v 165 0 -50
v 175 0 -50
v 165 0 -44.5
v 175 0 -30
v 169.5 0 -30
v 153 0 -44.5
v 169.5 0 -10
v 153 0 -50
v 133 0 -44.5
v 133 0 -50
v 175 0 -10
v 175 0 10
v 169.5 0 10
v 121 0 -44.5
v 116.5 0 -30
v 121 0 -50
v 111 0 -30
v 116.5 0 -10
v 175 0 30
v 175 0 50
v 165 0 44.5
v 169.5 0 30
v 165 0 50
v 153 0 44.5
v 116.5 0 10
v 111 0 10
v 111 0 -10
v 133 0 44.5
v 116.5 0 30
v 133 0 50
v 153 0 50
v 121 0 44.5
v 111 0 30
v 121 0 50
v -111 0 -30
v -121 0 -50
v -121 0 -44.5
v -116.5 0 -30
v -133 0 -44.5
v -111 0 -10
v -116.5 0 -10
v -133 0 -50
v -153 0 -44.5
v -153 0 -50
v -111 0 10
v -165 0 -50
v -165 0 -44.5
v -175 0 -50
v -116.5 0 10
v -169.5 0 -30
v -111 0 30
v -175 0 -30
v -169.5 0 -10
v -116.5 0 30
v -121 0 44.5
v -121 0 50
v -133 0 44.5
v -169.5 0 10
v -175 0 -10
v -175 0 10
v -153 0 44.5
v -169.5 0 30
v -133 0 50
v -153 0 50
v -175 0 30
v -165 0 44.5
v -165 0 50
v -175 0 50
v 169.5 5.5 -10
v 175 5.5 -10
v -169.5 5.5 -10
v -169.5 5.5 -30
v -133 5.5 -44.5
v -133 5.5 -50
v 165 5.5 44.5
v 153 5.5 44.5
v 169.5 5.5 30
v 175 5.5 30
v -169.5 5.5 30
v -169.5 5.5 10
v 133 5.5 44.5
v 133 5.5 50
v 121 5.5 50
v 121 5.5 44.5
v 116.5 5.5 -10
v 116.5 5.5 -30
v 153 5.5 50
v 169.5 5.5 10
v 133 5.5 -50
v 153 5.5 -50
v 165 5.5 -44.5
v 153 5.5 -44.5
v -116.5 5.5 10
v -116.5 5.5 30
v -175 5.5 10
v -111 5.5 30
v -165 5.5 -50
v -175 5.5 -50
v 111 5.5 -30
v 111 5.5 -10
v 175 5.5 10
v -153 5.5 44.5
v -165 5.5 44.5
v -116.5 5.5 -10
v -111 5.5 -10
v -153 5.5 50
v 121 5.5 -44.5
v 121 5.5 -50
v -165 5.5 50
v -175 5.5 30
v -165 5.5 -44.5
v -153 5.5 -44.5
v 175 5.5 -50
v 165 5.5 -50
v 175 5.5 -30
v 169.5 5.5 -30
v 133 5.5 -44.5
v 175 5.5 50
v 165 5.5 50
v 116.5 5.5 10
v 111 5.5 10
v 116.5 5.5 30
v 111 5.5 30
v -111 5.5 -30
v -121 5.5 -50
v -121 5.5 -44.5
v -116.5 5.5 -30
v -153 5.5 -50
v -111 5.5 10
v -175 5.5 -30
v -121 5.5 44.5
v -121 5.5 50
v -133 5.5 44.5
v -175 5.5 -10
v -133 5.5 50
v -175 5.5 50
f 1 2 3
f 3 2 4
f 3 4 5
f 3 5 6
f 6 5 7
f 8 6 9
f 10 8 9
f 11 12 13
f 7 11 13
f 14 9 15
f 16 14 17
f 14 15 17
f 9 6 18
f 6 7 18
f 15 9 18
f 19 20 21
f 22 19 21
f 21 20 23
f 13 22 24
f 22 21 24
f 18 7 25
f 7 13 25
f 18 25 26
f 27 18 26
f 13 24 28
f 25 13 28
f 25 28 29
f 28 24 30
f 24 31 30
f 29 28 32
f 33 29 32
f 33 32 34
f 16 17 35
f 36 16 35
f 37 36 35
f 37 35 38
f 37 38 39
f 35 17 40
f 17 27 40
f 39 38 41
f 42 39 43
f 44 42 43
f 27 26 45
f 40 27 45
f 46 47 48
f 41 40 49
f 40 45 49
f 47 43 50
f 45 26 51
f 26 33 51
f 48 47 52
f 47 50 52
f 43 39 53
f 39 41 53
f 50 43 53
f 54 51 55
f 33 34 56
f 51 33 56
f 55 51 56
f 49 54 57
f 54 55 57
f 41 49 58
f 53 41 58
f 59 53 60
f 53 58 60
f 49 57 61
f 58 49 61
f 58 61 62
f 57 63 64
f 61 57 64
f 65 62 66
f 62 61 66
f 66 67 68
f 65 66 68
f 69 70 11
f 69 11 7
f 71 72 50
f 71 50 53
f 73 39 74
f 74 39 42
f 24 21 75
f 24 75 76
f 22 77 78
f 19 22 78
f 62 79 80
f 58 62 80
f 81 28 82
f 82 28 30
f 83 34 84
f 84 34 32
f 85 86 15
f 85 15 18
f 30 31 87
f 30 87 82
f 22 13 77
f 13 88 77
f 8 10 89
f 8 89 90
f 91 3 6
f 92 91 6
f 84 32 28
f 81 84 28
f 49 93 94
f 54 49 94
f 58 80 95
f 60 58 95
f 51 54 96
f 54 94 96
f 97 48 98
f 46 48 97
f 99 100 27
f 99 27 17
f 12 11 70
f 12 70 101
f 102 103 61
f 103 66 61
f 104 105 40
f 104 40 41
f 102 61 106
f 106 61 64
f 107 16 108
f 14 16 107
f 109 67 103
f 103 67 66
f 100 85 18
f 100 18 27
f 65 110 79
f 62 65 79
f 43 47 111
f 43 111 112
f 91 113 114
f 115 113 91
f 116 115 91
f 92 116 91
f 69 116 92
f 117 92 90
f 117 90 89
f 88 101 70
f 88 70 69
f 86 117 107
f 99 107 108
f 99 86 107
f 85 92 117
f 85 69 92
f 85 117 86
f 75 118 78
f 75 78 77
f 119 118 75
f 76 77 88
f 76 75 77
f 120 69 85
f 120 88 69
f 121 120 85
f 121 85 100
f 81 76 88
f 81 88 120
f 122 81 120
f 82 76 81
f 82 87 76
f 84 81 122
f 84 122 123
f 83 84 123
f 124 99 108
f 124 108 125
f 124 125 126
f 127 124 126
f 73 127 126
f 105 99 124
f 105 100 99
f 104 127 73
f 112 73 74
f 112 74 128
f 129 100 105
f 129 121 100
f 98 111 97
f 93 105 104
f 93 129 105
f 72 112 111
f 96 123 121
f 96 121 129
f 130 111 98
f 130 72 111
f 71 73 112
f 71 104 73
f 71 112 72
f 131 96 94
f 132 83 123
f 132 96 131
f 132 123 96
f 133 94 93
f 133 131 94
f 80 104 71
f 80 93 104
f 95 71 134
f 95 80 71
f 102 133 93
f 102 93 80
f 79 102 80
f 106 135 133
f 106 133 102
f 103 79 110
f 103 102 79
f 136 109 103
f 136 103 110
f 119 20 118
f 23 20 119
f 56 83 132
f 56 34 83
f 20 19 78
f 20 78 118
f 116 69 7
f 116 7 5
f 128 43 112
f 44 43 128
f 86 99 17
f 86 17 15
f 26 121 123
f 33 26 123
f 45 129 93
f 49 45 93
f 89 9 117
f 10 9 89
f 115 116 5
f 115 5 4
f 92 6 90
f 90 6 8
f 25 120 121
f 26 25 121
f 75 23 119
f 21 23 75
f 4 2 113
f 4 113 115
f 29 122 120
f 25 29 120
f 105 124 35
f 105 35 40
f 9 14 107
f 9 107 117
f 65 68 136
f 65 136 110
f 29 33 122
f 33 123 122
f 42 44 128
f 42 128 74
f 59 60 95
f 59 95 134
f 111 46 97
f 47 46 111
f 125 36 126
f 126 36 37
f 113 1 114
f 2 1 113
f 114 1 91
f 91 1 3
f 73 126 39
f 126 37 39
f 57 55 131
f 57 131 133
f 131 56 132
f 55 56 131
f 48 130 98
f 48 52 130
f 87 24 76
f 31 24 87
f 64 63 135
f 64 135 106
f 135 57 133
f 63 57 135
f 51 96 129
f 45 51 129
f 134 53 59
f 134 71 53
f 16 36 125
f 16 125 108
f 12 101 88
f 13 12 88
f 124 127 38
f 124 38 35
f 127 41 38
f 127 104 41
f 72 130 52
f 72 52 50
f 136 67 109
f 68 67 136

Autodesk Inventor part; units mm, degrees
ref_plane "YZ Plane" through (0, 0, 0) normal (1, 0, 0) x (0, 1, 0)
ref_plane "XZ Plane" through (0, 0, 0) normal (0, 1, 0) x (-1, 0, 0)
ref_plane "XY Plane" through (0, 0, 0) normal (0, 0, 1) x (1, 0, 0)
sketch "Block1" plane through (0, 0, 0) normal (0, 0, 1) x (1, 0, 0)
  line L0 (-117.6, 50.1) -> (117.6, 50.1)
  line L1 (117.6, 50.1) -> (117.6, 41.1)
  line L2 (117.6, 41.1) -> (129.4, 41.1)
  line L3 (129.4, 41.1) -> (129.4, 50.1)
  line L4 (129.4, 50.1) -> (149.6, 50.1)
  line L5 (149.6, 50.1) -> (149.6, 41.1)
  line L6 (149.6, 41.1) -> (161.4, 41.1)
  line L7 (161.4, 41.1) -> (161.4, 50.1)
  line L8 (161.4, 50.1) -> (175.1, 50.1)
  line L9 (175.1, 50.1) -> (175.1, 29.9)
  line L10 (175.1, 29.9) -> (166.1, 29.9)
  line L11 (166.1, 29.9) -> (166.1, 10.1)
  line L12 (166.1, 10.1) -> (175.1, 10.1)
  line L13 (175.1, 10.1) -> (175.1, -10.1)
  line L14 (175.1, -10.1) -> (166.1, -10.1)
  line L15 (166.1, -10.1) -> (166.1, -29.9)
  line L16 (166.1, -29.9) -> (175.1, -29.9)
  line L17 (175.1, -29.9) -> (175.1, -50.1)
  line L18 (175.1, -50.1) -> (161.4, -50.1)
  line L19 (161.4, -50.1) -> (161.4, -41.1)
  line L20 (161.4, -41.1) -> (149.6, -41.1)
  line L21 (149.6, -41.1) -> (149.6, -50.1)
  line L22 (149.6, -50.1) -> (129.4, -50.1)
  line L23 (129.4, -50.1) -> (129.4, -41.1)
  line L24 (129.4, -41.1) -> (117.6, -41.1)
  line L25 (117.6, -41.1) -> (117.6, -50.1)
  line L26 (117.6, -50.1) -> (-117.6, -50.1)
  line L27 (-117.6, -50.1) -> (-117.6, -41.1)
  line L28 (-117.6, -41.1) -> (-129.4, -41.1)
  line L29 (-129.4, -41.1) -> (-129.4, -50.1)
  line L30 (-129.4, -50.1) -> (-149.6, -50.1)
  line L31 (-149.6, -50.1) -> (-149.6, -41.1)
  line L32 (-149.6, -41.1) -> (-161.4, -41.1)
  line L33 (-161.4, -41.1) -> (-161.4, -50.1)
  line L34 (-161.4, -50.1) -> (-175.1, -50.1)
  line L35 (-175.1, -50.1) -> (-175.1, -29.9)
  line L36 (-175.1, -29.9) -> (-166.1, -29.9)
  line L37 (-166.1, -29.9) -> (-166.1, -10.1)
  line L38 (-166.1, -10.1) -> (-175.1, -10.1)
  line L39 (-175.1, -10.1) -> (-175.1, 10.1)
  line L40 (-175.1, 10.1) -> (-166.1, 10.1)
  line L41 (-166.1, 10.1) -> (-166.1, 29.9)
  line L42 (-166.1, 29.9) -> (-175.1, 29.9)
  line L43 (-175.1, 29.9) -> (-175.1, 50.1)
  line L44 (-175.1, 50.1) -> (-161.4, 50.1)
  line L45 (-161.4, 50.1) -> (-161.4, 41.1)
  line L46 (-161.4, 41.1) -> (-149.6, 41.1)
  line L47 (-149.6, 41.1) -> (-149.6, 50.1)
  line L48 (-149.6, 50.1) -> (-129.4, 50.1)
  line L49 (-129.4, 50.1) -> (-129.4, 41.1)
  line L50 (-129.4, 41.1) -> (-117.6, 41.1)
  line L51 (-117.6, 41.1) -> (-117.6, 50.1)
  line L52 (-103.9, 30.1) -> (-103.9, 9.9)
  line L53 (-103.9, 9.9) -> (-113.1, 9.9)
  line L54 (-113.1, 9.9) -> (-113.1, 30.1)
  line L55 (-113.1, 30.1) -> (-103.9, 30.1)
  line L56 (-103.9, -9.9) -> (-113.1, -9.9)
  line L57 (-113.1, -9.9) -> (-113.1, -30.1)
  line L58 (-113.1, -30.1) -> (-103.9, -30.1)
  line L59 (-103.9, -30.1) -> (-103.9, -9.9)
  line L60 (113.1, 30.1) -> (113.1, 9.9)
  line L61 (113.1, 9.9) -> (103.9, 9.9)
  line L62 (103.9, 9.9) -> (103.9, 30.1)
  line L63 (103.9, 30.1) -> (113.1, 30.1)
  line L64 (113.1, -9.9) -> (103.9, -9.9)
  line L65 (103.9, -9.9) -> (103.9, -30.1)
  line L66 (103.9, -30.1) -> (113.1, -30.1)
  line L67 (113.1, -30.1) -> (113.1, -9.9)
  point P0 (0, 0)
sketch "Block2" plane through (0, 0, 0) normal (0, 0, 1) x (1, 0, 0)
  line L0 (-117.7, 50.2) -> (117.7, 50.2)
  line L1 (117.7, 50.2) -> (117.7, 41.2)
  line L2 (117.7, 41.2) -> (129.3, 41.2)
  line L3 (129.3, 41.2) -> (129.3, 50.2)
  line L4 (129.3, 50.2) -> (149.7, 50.2)
  line L5 (149.7, 50.2) -> (149.7, 41.2)
  line L6 (149.7, 41.2) -> (161.3, 41.2)
  line L7 (161.3, 41.2) -> (161.3, 50.2)
  line L8 (161.3, 50.2) -> (175.2, 50.2)
  line L9 (175.2, 50.2) -> (175.2, 29.8)
  line L10 (175.2, 29.8) -> (166.2, 29.8)
  line L11 (166.2, 29.8) -> (166.2, 10.2)
  line L12 (166.2, 10.2) -> (175.2, 10.2)
  line L13 (175.2, 10.2) -> (175.2, -10.2)
  line L14 (175.2, -10.2) -> (166.2, -10.2)
  line L15 (166.2, -10.2) -> (166.2, -29.8)
  line L16 (166.2, -29.8) -> (175.2, -29.8)
  line L17 (175.2, -29.8) -> (175.2, -50.2)
  line L18 (175.2, -50.2) -> (161.3, -50.2)
  line L19 (161.3, -50.2) -> (161.3, -41.2)
  line L20 (161.3, -41.2) -> (149.7, -41.2)
  line L21 (149.7, -41.2) -> (149.7, -50.2)
  line L22 (149.7, -50.2) -> (129.3, -50.2)
  line L23 (129.3, -50.2) -> (129.3, -41.2)
  line L24 (129.3, -41.2) -> (117.7, -41.2)
  line L25 (117.7, -41.2) -> (117.7, -50.2)
  line L26 (117.7, -50.2) -> (-117.7, -50.2)
  line L27 (-117.7, -50.2) -> (-117.7, -41.2)
  line L28 (-117.7, -41.2) -> (-129.3, -41.2)
  line L29 (-129.3, -41.2) -> (-129.3, -50.2)
  line L30 (-129.3, -50.2) -> (-149.7, -50.2)
  line L31 (-149.7, -50.2) -> (-149.7, -41.2)
  line L32 (-149.7, -41.2) -> (-161.3, -41.2)
  line L33 (-161.3, -41.2) -> (-161.3, -50.2)
  line L34 (-161.3, -50.2) -> (-175.2, -50.2)
  line L35 (-175.2, -50.2) -> (-175.2, -29.8)
  line L36 (-175.2, -29.8) -> (-166.2, -29.8)
  line L37 (-166.2, -29.8) -> (-166.2, -10.2)
  line L38 (-166.2, -10.2) -> (-175.2, -10.2)
  line L39 (-175.2, -10.2) -> (-175.2, 10.2)
  line L40 (-175.2, 10.2) -> (-166.2, 10.2)
  line L41 (-166.2, 10.2) -> (-166.2, 29.8)
  line L42 (-166.2, 29.8) -> (-175.2, 29.8)
  line L43 (-175.2, 29.8) -> (-175.2, 50.2)
  line L44 (-175.2, 50.2) -> (-161.3, 50.2)
  line L45 (-161.3, 50.2) -> (-161.3, 41.2)
  line L46 (-161.3, 41.2) -> (-149.7, 41.2)
  line L47 (-149.7, 41.2) -> (-149.7, 50.2)
  line L48 (-149.7, 50.2) -> (-129.3, 50.2)
  line L49 (-129.3, 50.2) -> (-129.3, 41.2)
  line L50 (-129.3, 41.2) -> (-117.7, 41.2)
  line L51 (-117.7, 41.2) -> (-117.7, 50.2)
  line L52 (-103.8, 30.2) -> (-103.8, 9.8)
  line L53 (-103.8, 9.8) -> (-113.2, 9.8)
  line L54 (-113.2, 9.8) -> (-113.2, 30.2)
  line L55 (-113.2, 30.2) -> (-103.8, 30.2)
  line L56 (-103.8, -9.8) -> (-113.2, -9.8)
  line L57 (-113.2, -9.8) -> (-113.2, -30.2)
  line L58 (-113.2, -30.2) -> (-103.8, -30.2)
  line L59 (-103.8, -30.2) -> (-103.8, -9.8)
  line L60 (113.2, 30.2) -> (113.2, 9.8)
  line L61 (113.2, 9.8) -> (103.8, 9.8)
  line L62 (103.8, 9.8) -> (103.8, 30.2)
  line L63 (103.8, 30.2) -> (113.2, 30.2)
  line L64 (113.2, -9.8) -> (103.8, -9.8)
  line L65 (103.8, -9.8) -> (103.8, -30.2)
  line L66 (103.8, -30.2) -> (113.2, -30.2)
  line L67 (113.2, -30.2) -> (113.2, -9.8)
  point P0 (0, 0)
sketch "Block3" plane through (0, 0, 0) normal (0, 0, 1) x (1, 0, 0)
  line L0 (-117.6, 50.1) -> (117.6, 50.1)
  line L1 (117.6, 50.1) -> (117.6, 41.1)
  line L2 (117.6, 41.1) -> (129.4, 41.1)
  line L3 (129.4, 41.1) -> (129.4, 50.1)
  line L4 (129.4, 50.1) -> (149.6, 50.1)
  line L5 (149.6, 50.1) -> (149.6, 41.1)
  line L6 (149.6, 41.1) -> (161.4, 41.1)
  line L7 (161.4, 41.1) -> (161.4, 50.1)
  line L8 (161.4, 50.1) -> (175.1, 50.1)
  line L9 (175.1, 50.1) -> (175.1, 29.9)
  line L10 (175.1, 29.9) -> (166.1, 29.9)
  line L11 (166.1, 29.9) -> (166.1, 10.1)
  line L12 (166.1, 10.1) -> (175.1, 10.1)
  line L13 (175.1, 10.1) -> (175.1, -10.1)
  line L14 (175.1, -10.1) -> (166.1, -10.1)
  line L15 (166.1, -10.1) -> (166.1, -29.9)
  line L16 (166.1, -29.9) -> (175.1, -29.9)
  line L17 (175.1, -29.9) -> (175.1, -50.1)
  line L18 (175.1, -50.1) -> (161.4, -50.1)
  line L19 (161.4, -50.1) -> (161.4, -41.1)
  line L20 (161.4, -41.1) -> (149.6, -41.1)
  line L21 (149.6, -41.1) -> (149.6, -50.1)
  line L22 (149.6, -50.1) -> (129.4, -50.1)
  line L23 (129.4, -50.1) -> (129.4, -41.1)
  line L24 (129.4, -41.1) -> (117.6, -41.1)
  line L25 (117.6, -41.1) -> (117.6, -50.1)
  line L26 (117.6, -50.1) -> (-117.6, -50.1)
  line L27 (-117.6, -50.1) -> (-117.6, -41.1)
  line L28 (-117.6, -41.1) -> (-129.4, -41.1)
  line L29 (-129.4, -41.1) -> (-129.4, -50.1)
  line L30 (-129.4, -50.1) -> (-149.6, -50.1)
  line L31 (-149.6, -50.1) -> (-149.6, -41.1)
  line L32 (-149.6, -41.1) -> (-161.4, -41.1)
  line L33 (-161.4, -41.1) -> (-161.4, -50.1)
  line L34 (-161.4, -50.1) -> (-175.1, -50.1)
  line L35 (-175.1, -50.1) -> (-175.1, -29.9)
  line L36 (-175.1, -29.9) -> (-166.1, -29.9)
  line L37 (-166.1, -29.9) -> (-166.1, -10.1)
  line L38 (-166.1, -10.1) -> (-175.1, -10.1)
  line L39 (-175.1, -10.1) -> (-175.1, 10.1)
  line L40 (-175.1, 10.1) -> (-166.1, 10.1)
  line L41 (-166.1, 10.1) -> (-166.1, 29.9)
  line L42 (-166.1, 29.9) -> (-175.1, 29.9)
  line L43 (-175.1, 29.9) -> (-175.1, 50.1)
  line L44 (-175.1, 50.1) -> (-161.4, 50.1)
  line L45 (-161.4, 50.1) -> (-161.4, 41.1)
  line L46 (-161.4, 41.1) -> (-149.6, 41.1)
  line L47 (-149.6, 41.1) -> (-149.6, 50.1)
  line L48 (-149.6, 50.1) -> (-129.4, 50.1)
  line L49 (-129.4, 50.1) -> (-129.4, 41.1)
  line L50 (-129.4, 41.1) -> (-117.6, 41.1)
  line L51 (-117.6, 41.1) -> (-117.6, 50.1)
  line L52 (-103.9, 30.1) -> (-103.9, 9.9)
  line L53 (-103.9, 9.9) -> (-113.1, 9.9)
  line L54 (-113.1, 9.9) -> (-113.1, 30.1)
  line L55 (-113.1, 30.1) -> (-103.9, 30.1)
  line L56 (-103.9, -9.9) -> (-113.1, -9.9)
  line L57 (-113.1, -9.9) -> (-113.1, -30.1)
  line L58 (-113.1, -30.1) -> (-103.9, -30.1)
  line L59 (-103.9, -30.1) -> (-103.9, -9.9)
  line L60 (113.1, 30.1) -> (113.1, 9.9)
  line L61 (113.1, 9.9) -> (103.9, 9.9)
  line L62 (103.9, 9.9) -> (103.9, 30.1)
  line L63 (103.9, 30.1) -> (113.1, 30.1)
  line L64 (113.1, -9.9) -> (103.9, -9.9)
  line L65 (103.9, -9.9) -> (103.9, -30.1)
  line L66 (103.9, -30.1) -> (113.1, -30.1)
  line L67 (113.1, -30.1) -> (113.1, -9.9)
  point P0 (0, 0)
sketch "Block4" plane through (0, 0, 0) normal (0, 0, 1) x (1, 0, 0)
  line L0 (-121.08, 50.08) -> (121.08, 50.08)
  line L1 (121.08, 50.08) -> (121.08, 44.58)
  line L2 (121.08, 44.58) -> (132.92, 44.58)
  line L3 (132.92, 44.58) -> (132.92, 50.08)
  line L4 (132.92, 50.08) -> (153.08, 50.08)
  line L5 (153.08, 50.08) -> (153.08, 44.58)
  line L6 (153.08, 44.58) -> (164.92, 44.58)
  line L7 (164.92, 44.58) -> (164.92, 50.08)
  line L8 (164.92, 50.08) -> (175.08, 50.08)
  line L9 (175.08, 50.08) -> (175.08, 29.92)
  line L10 (175.08, 29.92) -> (169.58, 29.92)
  line L11 (169.58, 29.92) -> (169.58, 10.08)
  line L12 (169.58, 10.08) -> (175.08, 10.08)
  line L13 (175.08, 10.08) -> (175.08, -10.08)
  line L14 (175.08, -10.08) -> (169.58, -10.08)
  line L15 (169.58, -10.08) -> (169.58, -29.92)
  line L16 (169.58, -29.92) -> (175.08, -29.92)
  line L17 (175.08, -29.92) -> (175.08, -50.08)
  line L18 (175.08, -50.08) -> (164.92, -50.08)
  line L19 (164.92, -50.08) -> (164.92, -44.58)
  line L20 (164.92, -44.58) -> (153.08, -44.58)
  line L21 (153.08, -44.58) -> (153.08, -50.08)
  line L22 (153.08, -50.08) -> (132.92, -50.08)
  line L23 (132.92, -50.08) -> (132.92, -44.58)
  line L24 (132.92, -44.58) -> (121.08, -44.58)
  line L25 (121.08, -44.58) -> (121.08, -50.08)
  line L26 (121.08, -50.08) -> (-121.08, -50.08)
  line L27 (-121.08, -50.08) -> (-121.08, -44.58)
  line L28 (-121.08, -44.58) -> (-132.92, -44.58)
  line L29 (-132.92, -44.58) -> (-132.92, -50.08)
  line L30 (-132.92, -50.08) -> (-153.08, -50.08)
  line L31 (-153.08, -50.08) -> (-153.08, -44.58)
  line L32 (-153.08, -44.58) -> (-164.92, -44.58)
  line L33 (-164.92, -44.58) -> (-164.92, -50.08)
  line L34 (-164.92, -50.08) -> (-175.08, -50.08)
  line L35 (-175.08, -50.08) -> (-175.08, -29.92)
  line L36 (-175.08, -29.92) -> (-169.58, -29.92)
  line L37 (-169.58, -29.92) -> (-169.58, -10.08)
  line L38 (-169.58, -10.08) -> (-175.08, -10.08)
  line L39 (-175.08, -10.08) -> (-175.08, 10.08)
  line L40 (-175.08, 10.08) -> (-169.58, 10.08)
  line L41 (-169.58, 10.08) -> (-169.58, 29.92)
  line L42 (-169.58, 29.92) -> (-175.08, 29.92)
  line L43 (-175.08, 29.92) -> (-175.08, 50.08)
  line L44 (-175.08, 50.08) -> (-164.92, 50.08)
  line L45 (-164.92, 50.08) -> (-164.92, 44.58)
  line L46 (-164.92, 44.58) -> (-153.08, 44.58)
  line L47 (-153.08, 44.58) -> (-153.08, 50.08)
  line L48 (-153.08, 50.08) -> (-132.92, 50.08)
  line L49 (-132.92, 50.08) -> (-132.92, 44.58)
  line L50 (-132.92, 44.58) -> (-121.08, 44.58)
  line L51 (-121.08, 44.58) -> (-121.08, 50.08)
  line L52 (-110.92, 30.08) -> (-110.92, 9.92)
  line L53 (-110.92, 9.92) -> (-116.58, 9.92)
  line L54 (-116.58, 9.92) -> (-116.58, 30.08)
  line L55 (-116.58, 30.08) -> (-110.92, 30.08)
  line L56 (-110.92, -9.92) -> (-116.58, -9.92)
  line L57 (-116.58, -9.92) -> (-116.58, -30.08)
  line L58 (-116.58, -30.08) -> (-110.92, -30.08)
  line L59 (-110.92, -30.08) -> (-110.92, -9.92)
  line L60 (116.58, 30.08) -> (116.58, 9.92)
  line L61 (116.58, 9.92) -> (110.92, 9.92)
  line L62 (110.92, 9.92) -> (110.92, 30.08)
  line L63 (110.92, 30.08) -> (116.58, 30.08)
  line L64 (116.58, -9.92) -> (110.92, -9.92)
  line L65 (110.92, -9.92) -> (110.92, -30.08)
  line L66 (110.92, -30.08) -> (116.58, -30.08)
  line L67 (116.58, -30.08) -> (116.58, -9.92)
  point P0 (0, 0)
sketch "Sketch1" plane through (0, 0, 0) normal (0, 1, 0) x (-1, 0, 0)
  line L0 (175, -50) -> (-175, -50)
  line L1 (-175, -50) -> (-175, 50)
  line L2 (-175, 50) -> (175, 50)
  line L3 (175, 50) -> (175, -50)
  line L4 (175, -50) -> (-175, 50) construction
  line L5 (-175, -50) -> (175, 50) construction
  line L6 (0, 0) -> (0, 75.8521)
  dimension "d0" = 350
  dimension "d1" = 100
extrude "Extrusion1" add sketch "Sketch1" along normal blind 5.5
sketch "Sketch6" plane through (0, 5.5, 0) normal (0, 1, 0) x (1, 0, 0)
  line L0 (175, 50) -> (-175, 50) projected
  line L1 (-175, 50) -> (-175, -50) projected
  line L2 (175, -50) -> (175, 50) projected
  line L3 (-116.5, 30) -> (-111, 30)
  line L4 (-111, 30) -> (-111, 10)
  line L5 (-111, 10) -> (-116.5, 10)
  line L6 (-116.5, 10) -> (-116.5, 30)
  line L7 (-175, 30) -> (-169.5, 30)
  line L8 (-169.5, 30) -> (-169.5, 10)
  line L9 (-169.5, 10) -> (-175, 10)
  line L10 (-175, 10) -> (-175, 30)
  line L11 (111, 30) -> (116.5, 30)
  line L12 (116.5, 30) -> (116.5, 10)
  line L13 (116.5, 10) -> (111, 10)
  line L14 (111, 10) -> (111, 30)
  line L15 (169.5, 30) -> (175, 30)
  line L16 (175, 30) -> (175, 10)
  line L17 (175, 10) -> (169.5, 10)
  line L18 (169.5, 10) -> (169.5, 30)
  line L19 (-321.0918, 0) -> (700.8506, 0) projected
  line L20 (0, 73.9124) -> (0, -70.7687) projected
  line L21 (-116.5, -30) -> (-111, -30)
  line L22 (-111, -30) -> (-111, -10)
  line L23 (-111, -10) -> (-116.5, -10)
  line L24 (-116.5, -10) -> (-116.5, -30)
  line L25 (-175, -30) -> (-169.5, -30)
  line L26 (-169.5, -30) -> (-169.5, -10)
  line L27 (-169.5, -10) -> (-175, -10)
  line L28 (-175, -10) -> (-175, -30)
  line L29 (111, -30) -> (116.5, -30)
  line L30 (116.5, -30) -> (116.5, -10)
  line L31 (116.5, -10) -> (111, -10)
  line L32 (111, -10) -> (111, -30)
  line L33 (169.5, -30) -> (175, -30)
  line L34 (175, -30) -> (175, -10)
  line L35 (175, -10) -> (169.5, -10)
  line L36 (169.5, -10) -> (169.5, -30)
  point P0 (0, 0)
  dimension "d31" = 20
  dimension "d32" = 20
  dimension "d33" = 20
  dimension "d34" = 20
  dimension "d35" = 20
  dimension "d36" = 20
  dimension "d37" = 20
  dimension "d38" = 20
  dimension "d39" = 5.5
  dimension "d40" = 5.5
  dimension "d41" = 5.5
  dimension "d42" = 5.5
  dimension "d43" = 53
  dimension "d44" = 53
extrude "Extrusion2" cut sketch "Sketch6" against normal through all contours L2 L33 L36 L35 | L27 L26 L25 L1 | L2 L17 L18 L15 | L7 L8 L9 L1 | L3 L4 L5 L6 | L11 L12 L13 L14 | L24 L23 L22 L21 | L32 L31 L30 L29
sketch "Sketch8" plane through (0, 0, 0) normal (0, -1, 0) x (1, 0, 0)
  line L0 (-175, -50) -> (175, -50) projected
  line L1 (111, 30) -> (116.5, 30) projected
  line L2 (-175, 59.2811) -> (-175, -60.1862)
  line L3 (-111, 61.9963) -> (-111, -60.1862)
  line L4 (-143, 61.9963) -> (-143, -69.2367)
  line L5 (-321.0918, 0) -> (700.8506, 0) projected
  line L6 (-153, -50) -> (-165, -50)
  line L7 (-165, -50) -> (-165, -44.5)
  line L8 (-165, -44.5) -> (-153, -44.5)
  line L9 (-153, -44.5) -> (-153, -50)
  line L10 (-133, -50) -> (-121, -50)
  line L11 (-121, -50) -> (-121, -44.5)
  line L12 (-121, -44.5) -> (-133, -44.5)
  line L13 (-133, -44.5) -> (-133, -50)
  line L14 (-153, 50) -> (-165, 50)
  line L15 (-165, 50) -> (-165, 44.5)
  line L16 (-165, 44.5) -> (-153, 44.5)
  line L17 (-153, 44.5) -> (-153, 50)
  line L18 (-121, 44.5) -> (-133, 44.5)
  line L19 (-133, 44.5) -> (-133, 50)
  line L20 (-121, 50) -> (-121, 44.5)
  line L21 (-133, 50) -> (-121, 50)
  line L22 (175, -10) -> (175, 10) projected
  line L23 (0, 69.8052) -> (0, -77.7744)
  line L24 (153, -50) -> (165, -50)
  line L25 (165, -50) -> (165, -44.5)
  line L26 (165, -44.5) -> (153, -44.5)
  line L27 (153, -44.5) -> (153, -50)
  line L28 (121, -44.5) -> (133, -44.5)
  line L29 (133, -44.5) -> (133, -50)
  line L30 (121, -50) -> (121, -44.5)
  line L31 (133, -50) -> (121, -50)
  line L32 (121, 50) -> (121, 44.5)
  line L33 (121, 44.5) -> (133, 44.5)
  line L34 (133, 50) -> (121, 50)
  line L35 (133, 44.5) -> (133, 50)
  line L36 (153, 44.5) -> (153, 50)
  line L37 (165, 44.5) -> (153, 44.5)
  line L38 (153, 50) -> (165, 50)
  line L39 (165, 50) -> (165, 44.5)
  line L40 (-175, 50) -> (-175, 30) projected
  point P0 (117.5, -50)
  point P1 (0, 0)
  dimension "d54" = 12
  dimension "d55" = 20
  dimension "d58" = 5.5
  dimension "d61" = 64
extrude "Extrusion5" cut sketch "Sketch8" against normal through all contours L27 L26 L25 L0 | L30 L28 L29 L0 | L7 L8 L9 L0 | L13 L12 L11 L0 | L17 L16 L15 L14 | L18 L19 L21 L20 | L34 L35 L33 L32 | L36 L38 L39 L37
equation "\"d0\" = Base_length"
equation "\"d2\" = Wt"
equation "\"d39\" = Wt"
equation "\"d40\" = Wt"
equation "\"d41\" = Wt"
equation "\"d42\" = Wt"
equation "\"d58\" = Wt"
equation "\"Base_length\" = 350"
equation "\"Wt\" = 5.5"
properties part number "baseboard" material "Wood (Birch)"
